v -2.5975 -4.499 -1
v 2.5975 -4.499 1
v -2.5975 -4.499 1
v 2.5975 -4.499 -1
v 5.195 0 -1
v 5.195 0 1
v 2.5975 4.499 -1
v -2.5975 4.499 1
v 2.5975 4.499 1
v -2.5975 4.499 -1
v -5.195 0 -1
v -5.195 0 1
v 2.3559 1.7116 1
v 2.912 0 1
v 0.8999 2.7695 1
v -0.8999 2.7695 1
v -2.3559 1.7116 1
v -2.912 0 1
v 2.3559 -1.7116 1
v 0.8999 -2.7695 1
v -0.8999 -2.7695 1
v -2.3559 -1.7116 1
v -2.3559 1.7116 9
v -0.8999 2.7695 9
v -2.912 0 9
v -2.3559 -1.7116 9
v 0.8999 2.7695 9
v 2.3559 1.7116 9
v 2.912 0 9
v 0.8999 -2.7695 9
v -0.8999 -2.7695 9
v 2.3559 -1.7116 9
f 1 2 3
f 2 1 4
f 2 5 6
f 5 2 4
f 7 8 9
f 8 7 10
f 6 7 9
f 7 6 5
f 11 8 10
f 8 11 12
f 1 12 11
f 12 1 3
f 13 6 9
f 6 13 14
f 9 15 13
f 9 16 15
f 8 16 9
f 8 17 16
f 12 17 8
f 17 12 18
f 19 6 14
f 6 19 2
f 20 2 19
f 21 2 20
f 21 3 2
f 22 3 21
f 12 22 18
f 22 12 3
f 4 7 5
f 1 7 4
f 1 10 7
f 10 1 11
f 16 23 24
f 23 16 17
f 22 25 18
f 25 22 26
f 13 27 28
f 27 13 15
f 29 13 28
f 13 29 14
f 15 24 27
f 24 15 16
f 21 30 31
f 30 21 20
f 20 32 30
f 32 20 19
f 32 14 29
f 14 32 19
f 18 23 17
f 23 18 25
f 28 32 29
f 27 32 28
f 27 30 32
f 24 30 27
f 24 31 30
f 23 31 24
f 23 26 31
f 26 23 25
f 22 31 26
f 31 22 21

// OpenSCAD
//Author: Piotr Paterek, Kraków 05-08.2016
cylinder(r=5.195,h=2,$fn=6, center=true);
translate([0,0,5])
{
    cylinder(r=2.912,h=8,center=true);
}
